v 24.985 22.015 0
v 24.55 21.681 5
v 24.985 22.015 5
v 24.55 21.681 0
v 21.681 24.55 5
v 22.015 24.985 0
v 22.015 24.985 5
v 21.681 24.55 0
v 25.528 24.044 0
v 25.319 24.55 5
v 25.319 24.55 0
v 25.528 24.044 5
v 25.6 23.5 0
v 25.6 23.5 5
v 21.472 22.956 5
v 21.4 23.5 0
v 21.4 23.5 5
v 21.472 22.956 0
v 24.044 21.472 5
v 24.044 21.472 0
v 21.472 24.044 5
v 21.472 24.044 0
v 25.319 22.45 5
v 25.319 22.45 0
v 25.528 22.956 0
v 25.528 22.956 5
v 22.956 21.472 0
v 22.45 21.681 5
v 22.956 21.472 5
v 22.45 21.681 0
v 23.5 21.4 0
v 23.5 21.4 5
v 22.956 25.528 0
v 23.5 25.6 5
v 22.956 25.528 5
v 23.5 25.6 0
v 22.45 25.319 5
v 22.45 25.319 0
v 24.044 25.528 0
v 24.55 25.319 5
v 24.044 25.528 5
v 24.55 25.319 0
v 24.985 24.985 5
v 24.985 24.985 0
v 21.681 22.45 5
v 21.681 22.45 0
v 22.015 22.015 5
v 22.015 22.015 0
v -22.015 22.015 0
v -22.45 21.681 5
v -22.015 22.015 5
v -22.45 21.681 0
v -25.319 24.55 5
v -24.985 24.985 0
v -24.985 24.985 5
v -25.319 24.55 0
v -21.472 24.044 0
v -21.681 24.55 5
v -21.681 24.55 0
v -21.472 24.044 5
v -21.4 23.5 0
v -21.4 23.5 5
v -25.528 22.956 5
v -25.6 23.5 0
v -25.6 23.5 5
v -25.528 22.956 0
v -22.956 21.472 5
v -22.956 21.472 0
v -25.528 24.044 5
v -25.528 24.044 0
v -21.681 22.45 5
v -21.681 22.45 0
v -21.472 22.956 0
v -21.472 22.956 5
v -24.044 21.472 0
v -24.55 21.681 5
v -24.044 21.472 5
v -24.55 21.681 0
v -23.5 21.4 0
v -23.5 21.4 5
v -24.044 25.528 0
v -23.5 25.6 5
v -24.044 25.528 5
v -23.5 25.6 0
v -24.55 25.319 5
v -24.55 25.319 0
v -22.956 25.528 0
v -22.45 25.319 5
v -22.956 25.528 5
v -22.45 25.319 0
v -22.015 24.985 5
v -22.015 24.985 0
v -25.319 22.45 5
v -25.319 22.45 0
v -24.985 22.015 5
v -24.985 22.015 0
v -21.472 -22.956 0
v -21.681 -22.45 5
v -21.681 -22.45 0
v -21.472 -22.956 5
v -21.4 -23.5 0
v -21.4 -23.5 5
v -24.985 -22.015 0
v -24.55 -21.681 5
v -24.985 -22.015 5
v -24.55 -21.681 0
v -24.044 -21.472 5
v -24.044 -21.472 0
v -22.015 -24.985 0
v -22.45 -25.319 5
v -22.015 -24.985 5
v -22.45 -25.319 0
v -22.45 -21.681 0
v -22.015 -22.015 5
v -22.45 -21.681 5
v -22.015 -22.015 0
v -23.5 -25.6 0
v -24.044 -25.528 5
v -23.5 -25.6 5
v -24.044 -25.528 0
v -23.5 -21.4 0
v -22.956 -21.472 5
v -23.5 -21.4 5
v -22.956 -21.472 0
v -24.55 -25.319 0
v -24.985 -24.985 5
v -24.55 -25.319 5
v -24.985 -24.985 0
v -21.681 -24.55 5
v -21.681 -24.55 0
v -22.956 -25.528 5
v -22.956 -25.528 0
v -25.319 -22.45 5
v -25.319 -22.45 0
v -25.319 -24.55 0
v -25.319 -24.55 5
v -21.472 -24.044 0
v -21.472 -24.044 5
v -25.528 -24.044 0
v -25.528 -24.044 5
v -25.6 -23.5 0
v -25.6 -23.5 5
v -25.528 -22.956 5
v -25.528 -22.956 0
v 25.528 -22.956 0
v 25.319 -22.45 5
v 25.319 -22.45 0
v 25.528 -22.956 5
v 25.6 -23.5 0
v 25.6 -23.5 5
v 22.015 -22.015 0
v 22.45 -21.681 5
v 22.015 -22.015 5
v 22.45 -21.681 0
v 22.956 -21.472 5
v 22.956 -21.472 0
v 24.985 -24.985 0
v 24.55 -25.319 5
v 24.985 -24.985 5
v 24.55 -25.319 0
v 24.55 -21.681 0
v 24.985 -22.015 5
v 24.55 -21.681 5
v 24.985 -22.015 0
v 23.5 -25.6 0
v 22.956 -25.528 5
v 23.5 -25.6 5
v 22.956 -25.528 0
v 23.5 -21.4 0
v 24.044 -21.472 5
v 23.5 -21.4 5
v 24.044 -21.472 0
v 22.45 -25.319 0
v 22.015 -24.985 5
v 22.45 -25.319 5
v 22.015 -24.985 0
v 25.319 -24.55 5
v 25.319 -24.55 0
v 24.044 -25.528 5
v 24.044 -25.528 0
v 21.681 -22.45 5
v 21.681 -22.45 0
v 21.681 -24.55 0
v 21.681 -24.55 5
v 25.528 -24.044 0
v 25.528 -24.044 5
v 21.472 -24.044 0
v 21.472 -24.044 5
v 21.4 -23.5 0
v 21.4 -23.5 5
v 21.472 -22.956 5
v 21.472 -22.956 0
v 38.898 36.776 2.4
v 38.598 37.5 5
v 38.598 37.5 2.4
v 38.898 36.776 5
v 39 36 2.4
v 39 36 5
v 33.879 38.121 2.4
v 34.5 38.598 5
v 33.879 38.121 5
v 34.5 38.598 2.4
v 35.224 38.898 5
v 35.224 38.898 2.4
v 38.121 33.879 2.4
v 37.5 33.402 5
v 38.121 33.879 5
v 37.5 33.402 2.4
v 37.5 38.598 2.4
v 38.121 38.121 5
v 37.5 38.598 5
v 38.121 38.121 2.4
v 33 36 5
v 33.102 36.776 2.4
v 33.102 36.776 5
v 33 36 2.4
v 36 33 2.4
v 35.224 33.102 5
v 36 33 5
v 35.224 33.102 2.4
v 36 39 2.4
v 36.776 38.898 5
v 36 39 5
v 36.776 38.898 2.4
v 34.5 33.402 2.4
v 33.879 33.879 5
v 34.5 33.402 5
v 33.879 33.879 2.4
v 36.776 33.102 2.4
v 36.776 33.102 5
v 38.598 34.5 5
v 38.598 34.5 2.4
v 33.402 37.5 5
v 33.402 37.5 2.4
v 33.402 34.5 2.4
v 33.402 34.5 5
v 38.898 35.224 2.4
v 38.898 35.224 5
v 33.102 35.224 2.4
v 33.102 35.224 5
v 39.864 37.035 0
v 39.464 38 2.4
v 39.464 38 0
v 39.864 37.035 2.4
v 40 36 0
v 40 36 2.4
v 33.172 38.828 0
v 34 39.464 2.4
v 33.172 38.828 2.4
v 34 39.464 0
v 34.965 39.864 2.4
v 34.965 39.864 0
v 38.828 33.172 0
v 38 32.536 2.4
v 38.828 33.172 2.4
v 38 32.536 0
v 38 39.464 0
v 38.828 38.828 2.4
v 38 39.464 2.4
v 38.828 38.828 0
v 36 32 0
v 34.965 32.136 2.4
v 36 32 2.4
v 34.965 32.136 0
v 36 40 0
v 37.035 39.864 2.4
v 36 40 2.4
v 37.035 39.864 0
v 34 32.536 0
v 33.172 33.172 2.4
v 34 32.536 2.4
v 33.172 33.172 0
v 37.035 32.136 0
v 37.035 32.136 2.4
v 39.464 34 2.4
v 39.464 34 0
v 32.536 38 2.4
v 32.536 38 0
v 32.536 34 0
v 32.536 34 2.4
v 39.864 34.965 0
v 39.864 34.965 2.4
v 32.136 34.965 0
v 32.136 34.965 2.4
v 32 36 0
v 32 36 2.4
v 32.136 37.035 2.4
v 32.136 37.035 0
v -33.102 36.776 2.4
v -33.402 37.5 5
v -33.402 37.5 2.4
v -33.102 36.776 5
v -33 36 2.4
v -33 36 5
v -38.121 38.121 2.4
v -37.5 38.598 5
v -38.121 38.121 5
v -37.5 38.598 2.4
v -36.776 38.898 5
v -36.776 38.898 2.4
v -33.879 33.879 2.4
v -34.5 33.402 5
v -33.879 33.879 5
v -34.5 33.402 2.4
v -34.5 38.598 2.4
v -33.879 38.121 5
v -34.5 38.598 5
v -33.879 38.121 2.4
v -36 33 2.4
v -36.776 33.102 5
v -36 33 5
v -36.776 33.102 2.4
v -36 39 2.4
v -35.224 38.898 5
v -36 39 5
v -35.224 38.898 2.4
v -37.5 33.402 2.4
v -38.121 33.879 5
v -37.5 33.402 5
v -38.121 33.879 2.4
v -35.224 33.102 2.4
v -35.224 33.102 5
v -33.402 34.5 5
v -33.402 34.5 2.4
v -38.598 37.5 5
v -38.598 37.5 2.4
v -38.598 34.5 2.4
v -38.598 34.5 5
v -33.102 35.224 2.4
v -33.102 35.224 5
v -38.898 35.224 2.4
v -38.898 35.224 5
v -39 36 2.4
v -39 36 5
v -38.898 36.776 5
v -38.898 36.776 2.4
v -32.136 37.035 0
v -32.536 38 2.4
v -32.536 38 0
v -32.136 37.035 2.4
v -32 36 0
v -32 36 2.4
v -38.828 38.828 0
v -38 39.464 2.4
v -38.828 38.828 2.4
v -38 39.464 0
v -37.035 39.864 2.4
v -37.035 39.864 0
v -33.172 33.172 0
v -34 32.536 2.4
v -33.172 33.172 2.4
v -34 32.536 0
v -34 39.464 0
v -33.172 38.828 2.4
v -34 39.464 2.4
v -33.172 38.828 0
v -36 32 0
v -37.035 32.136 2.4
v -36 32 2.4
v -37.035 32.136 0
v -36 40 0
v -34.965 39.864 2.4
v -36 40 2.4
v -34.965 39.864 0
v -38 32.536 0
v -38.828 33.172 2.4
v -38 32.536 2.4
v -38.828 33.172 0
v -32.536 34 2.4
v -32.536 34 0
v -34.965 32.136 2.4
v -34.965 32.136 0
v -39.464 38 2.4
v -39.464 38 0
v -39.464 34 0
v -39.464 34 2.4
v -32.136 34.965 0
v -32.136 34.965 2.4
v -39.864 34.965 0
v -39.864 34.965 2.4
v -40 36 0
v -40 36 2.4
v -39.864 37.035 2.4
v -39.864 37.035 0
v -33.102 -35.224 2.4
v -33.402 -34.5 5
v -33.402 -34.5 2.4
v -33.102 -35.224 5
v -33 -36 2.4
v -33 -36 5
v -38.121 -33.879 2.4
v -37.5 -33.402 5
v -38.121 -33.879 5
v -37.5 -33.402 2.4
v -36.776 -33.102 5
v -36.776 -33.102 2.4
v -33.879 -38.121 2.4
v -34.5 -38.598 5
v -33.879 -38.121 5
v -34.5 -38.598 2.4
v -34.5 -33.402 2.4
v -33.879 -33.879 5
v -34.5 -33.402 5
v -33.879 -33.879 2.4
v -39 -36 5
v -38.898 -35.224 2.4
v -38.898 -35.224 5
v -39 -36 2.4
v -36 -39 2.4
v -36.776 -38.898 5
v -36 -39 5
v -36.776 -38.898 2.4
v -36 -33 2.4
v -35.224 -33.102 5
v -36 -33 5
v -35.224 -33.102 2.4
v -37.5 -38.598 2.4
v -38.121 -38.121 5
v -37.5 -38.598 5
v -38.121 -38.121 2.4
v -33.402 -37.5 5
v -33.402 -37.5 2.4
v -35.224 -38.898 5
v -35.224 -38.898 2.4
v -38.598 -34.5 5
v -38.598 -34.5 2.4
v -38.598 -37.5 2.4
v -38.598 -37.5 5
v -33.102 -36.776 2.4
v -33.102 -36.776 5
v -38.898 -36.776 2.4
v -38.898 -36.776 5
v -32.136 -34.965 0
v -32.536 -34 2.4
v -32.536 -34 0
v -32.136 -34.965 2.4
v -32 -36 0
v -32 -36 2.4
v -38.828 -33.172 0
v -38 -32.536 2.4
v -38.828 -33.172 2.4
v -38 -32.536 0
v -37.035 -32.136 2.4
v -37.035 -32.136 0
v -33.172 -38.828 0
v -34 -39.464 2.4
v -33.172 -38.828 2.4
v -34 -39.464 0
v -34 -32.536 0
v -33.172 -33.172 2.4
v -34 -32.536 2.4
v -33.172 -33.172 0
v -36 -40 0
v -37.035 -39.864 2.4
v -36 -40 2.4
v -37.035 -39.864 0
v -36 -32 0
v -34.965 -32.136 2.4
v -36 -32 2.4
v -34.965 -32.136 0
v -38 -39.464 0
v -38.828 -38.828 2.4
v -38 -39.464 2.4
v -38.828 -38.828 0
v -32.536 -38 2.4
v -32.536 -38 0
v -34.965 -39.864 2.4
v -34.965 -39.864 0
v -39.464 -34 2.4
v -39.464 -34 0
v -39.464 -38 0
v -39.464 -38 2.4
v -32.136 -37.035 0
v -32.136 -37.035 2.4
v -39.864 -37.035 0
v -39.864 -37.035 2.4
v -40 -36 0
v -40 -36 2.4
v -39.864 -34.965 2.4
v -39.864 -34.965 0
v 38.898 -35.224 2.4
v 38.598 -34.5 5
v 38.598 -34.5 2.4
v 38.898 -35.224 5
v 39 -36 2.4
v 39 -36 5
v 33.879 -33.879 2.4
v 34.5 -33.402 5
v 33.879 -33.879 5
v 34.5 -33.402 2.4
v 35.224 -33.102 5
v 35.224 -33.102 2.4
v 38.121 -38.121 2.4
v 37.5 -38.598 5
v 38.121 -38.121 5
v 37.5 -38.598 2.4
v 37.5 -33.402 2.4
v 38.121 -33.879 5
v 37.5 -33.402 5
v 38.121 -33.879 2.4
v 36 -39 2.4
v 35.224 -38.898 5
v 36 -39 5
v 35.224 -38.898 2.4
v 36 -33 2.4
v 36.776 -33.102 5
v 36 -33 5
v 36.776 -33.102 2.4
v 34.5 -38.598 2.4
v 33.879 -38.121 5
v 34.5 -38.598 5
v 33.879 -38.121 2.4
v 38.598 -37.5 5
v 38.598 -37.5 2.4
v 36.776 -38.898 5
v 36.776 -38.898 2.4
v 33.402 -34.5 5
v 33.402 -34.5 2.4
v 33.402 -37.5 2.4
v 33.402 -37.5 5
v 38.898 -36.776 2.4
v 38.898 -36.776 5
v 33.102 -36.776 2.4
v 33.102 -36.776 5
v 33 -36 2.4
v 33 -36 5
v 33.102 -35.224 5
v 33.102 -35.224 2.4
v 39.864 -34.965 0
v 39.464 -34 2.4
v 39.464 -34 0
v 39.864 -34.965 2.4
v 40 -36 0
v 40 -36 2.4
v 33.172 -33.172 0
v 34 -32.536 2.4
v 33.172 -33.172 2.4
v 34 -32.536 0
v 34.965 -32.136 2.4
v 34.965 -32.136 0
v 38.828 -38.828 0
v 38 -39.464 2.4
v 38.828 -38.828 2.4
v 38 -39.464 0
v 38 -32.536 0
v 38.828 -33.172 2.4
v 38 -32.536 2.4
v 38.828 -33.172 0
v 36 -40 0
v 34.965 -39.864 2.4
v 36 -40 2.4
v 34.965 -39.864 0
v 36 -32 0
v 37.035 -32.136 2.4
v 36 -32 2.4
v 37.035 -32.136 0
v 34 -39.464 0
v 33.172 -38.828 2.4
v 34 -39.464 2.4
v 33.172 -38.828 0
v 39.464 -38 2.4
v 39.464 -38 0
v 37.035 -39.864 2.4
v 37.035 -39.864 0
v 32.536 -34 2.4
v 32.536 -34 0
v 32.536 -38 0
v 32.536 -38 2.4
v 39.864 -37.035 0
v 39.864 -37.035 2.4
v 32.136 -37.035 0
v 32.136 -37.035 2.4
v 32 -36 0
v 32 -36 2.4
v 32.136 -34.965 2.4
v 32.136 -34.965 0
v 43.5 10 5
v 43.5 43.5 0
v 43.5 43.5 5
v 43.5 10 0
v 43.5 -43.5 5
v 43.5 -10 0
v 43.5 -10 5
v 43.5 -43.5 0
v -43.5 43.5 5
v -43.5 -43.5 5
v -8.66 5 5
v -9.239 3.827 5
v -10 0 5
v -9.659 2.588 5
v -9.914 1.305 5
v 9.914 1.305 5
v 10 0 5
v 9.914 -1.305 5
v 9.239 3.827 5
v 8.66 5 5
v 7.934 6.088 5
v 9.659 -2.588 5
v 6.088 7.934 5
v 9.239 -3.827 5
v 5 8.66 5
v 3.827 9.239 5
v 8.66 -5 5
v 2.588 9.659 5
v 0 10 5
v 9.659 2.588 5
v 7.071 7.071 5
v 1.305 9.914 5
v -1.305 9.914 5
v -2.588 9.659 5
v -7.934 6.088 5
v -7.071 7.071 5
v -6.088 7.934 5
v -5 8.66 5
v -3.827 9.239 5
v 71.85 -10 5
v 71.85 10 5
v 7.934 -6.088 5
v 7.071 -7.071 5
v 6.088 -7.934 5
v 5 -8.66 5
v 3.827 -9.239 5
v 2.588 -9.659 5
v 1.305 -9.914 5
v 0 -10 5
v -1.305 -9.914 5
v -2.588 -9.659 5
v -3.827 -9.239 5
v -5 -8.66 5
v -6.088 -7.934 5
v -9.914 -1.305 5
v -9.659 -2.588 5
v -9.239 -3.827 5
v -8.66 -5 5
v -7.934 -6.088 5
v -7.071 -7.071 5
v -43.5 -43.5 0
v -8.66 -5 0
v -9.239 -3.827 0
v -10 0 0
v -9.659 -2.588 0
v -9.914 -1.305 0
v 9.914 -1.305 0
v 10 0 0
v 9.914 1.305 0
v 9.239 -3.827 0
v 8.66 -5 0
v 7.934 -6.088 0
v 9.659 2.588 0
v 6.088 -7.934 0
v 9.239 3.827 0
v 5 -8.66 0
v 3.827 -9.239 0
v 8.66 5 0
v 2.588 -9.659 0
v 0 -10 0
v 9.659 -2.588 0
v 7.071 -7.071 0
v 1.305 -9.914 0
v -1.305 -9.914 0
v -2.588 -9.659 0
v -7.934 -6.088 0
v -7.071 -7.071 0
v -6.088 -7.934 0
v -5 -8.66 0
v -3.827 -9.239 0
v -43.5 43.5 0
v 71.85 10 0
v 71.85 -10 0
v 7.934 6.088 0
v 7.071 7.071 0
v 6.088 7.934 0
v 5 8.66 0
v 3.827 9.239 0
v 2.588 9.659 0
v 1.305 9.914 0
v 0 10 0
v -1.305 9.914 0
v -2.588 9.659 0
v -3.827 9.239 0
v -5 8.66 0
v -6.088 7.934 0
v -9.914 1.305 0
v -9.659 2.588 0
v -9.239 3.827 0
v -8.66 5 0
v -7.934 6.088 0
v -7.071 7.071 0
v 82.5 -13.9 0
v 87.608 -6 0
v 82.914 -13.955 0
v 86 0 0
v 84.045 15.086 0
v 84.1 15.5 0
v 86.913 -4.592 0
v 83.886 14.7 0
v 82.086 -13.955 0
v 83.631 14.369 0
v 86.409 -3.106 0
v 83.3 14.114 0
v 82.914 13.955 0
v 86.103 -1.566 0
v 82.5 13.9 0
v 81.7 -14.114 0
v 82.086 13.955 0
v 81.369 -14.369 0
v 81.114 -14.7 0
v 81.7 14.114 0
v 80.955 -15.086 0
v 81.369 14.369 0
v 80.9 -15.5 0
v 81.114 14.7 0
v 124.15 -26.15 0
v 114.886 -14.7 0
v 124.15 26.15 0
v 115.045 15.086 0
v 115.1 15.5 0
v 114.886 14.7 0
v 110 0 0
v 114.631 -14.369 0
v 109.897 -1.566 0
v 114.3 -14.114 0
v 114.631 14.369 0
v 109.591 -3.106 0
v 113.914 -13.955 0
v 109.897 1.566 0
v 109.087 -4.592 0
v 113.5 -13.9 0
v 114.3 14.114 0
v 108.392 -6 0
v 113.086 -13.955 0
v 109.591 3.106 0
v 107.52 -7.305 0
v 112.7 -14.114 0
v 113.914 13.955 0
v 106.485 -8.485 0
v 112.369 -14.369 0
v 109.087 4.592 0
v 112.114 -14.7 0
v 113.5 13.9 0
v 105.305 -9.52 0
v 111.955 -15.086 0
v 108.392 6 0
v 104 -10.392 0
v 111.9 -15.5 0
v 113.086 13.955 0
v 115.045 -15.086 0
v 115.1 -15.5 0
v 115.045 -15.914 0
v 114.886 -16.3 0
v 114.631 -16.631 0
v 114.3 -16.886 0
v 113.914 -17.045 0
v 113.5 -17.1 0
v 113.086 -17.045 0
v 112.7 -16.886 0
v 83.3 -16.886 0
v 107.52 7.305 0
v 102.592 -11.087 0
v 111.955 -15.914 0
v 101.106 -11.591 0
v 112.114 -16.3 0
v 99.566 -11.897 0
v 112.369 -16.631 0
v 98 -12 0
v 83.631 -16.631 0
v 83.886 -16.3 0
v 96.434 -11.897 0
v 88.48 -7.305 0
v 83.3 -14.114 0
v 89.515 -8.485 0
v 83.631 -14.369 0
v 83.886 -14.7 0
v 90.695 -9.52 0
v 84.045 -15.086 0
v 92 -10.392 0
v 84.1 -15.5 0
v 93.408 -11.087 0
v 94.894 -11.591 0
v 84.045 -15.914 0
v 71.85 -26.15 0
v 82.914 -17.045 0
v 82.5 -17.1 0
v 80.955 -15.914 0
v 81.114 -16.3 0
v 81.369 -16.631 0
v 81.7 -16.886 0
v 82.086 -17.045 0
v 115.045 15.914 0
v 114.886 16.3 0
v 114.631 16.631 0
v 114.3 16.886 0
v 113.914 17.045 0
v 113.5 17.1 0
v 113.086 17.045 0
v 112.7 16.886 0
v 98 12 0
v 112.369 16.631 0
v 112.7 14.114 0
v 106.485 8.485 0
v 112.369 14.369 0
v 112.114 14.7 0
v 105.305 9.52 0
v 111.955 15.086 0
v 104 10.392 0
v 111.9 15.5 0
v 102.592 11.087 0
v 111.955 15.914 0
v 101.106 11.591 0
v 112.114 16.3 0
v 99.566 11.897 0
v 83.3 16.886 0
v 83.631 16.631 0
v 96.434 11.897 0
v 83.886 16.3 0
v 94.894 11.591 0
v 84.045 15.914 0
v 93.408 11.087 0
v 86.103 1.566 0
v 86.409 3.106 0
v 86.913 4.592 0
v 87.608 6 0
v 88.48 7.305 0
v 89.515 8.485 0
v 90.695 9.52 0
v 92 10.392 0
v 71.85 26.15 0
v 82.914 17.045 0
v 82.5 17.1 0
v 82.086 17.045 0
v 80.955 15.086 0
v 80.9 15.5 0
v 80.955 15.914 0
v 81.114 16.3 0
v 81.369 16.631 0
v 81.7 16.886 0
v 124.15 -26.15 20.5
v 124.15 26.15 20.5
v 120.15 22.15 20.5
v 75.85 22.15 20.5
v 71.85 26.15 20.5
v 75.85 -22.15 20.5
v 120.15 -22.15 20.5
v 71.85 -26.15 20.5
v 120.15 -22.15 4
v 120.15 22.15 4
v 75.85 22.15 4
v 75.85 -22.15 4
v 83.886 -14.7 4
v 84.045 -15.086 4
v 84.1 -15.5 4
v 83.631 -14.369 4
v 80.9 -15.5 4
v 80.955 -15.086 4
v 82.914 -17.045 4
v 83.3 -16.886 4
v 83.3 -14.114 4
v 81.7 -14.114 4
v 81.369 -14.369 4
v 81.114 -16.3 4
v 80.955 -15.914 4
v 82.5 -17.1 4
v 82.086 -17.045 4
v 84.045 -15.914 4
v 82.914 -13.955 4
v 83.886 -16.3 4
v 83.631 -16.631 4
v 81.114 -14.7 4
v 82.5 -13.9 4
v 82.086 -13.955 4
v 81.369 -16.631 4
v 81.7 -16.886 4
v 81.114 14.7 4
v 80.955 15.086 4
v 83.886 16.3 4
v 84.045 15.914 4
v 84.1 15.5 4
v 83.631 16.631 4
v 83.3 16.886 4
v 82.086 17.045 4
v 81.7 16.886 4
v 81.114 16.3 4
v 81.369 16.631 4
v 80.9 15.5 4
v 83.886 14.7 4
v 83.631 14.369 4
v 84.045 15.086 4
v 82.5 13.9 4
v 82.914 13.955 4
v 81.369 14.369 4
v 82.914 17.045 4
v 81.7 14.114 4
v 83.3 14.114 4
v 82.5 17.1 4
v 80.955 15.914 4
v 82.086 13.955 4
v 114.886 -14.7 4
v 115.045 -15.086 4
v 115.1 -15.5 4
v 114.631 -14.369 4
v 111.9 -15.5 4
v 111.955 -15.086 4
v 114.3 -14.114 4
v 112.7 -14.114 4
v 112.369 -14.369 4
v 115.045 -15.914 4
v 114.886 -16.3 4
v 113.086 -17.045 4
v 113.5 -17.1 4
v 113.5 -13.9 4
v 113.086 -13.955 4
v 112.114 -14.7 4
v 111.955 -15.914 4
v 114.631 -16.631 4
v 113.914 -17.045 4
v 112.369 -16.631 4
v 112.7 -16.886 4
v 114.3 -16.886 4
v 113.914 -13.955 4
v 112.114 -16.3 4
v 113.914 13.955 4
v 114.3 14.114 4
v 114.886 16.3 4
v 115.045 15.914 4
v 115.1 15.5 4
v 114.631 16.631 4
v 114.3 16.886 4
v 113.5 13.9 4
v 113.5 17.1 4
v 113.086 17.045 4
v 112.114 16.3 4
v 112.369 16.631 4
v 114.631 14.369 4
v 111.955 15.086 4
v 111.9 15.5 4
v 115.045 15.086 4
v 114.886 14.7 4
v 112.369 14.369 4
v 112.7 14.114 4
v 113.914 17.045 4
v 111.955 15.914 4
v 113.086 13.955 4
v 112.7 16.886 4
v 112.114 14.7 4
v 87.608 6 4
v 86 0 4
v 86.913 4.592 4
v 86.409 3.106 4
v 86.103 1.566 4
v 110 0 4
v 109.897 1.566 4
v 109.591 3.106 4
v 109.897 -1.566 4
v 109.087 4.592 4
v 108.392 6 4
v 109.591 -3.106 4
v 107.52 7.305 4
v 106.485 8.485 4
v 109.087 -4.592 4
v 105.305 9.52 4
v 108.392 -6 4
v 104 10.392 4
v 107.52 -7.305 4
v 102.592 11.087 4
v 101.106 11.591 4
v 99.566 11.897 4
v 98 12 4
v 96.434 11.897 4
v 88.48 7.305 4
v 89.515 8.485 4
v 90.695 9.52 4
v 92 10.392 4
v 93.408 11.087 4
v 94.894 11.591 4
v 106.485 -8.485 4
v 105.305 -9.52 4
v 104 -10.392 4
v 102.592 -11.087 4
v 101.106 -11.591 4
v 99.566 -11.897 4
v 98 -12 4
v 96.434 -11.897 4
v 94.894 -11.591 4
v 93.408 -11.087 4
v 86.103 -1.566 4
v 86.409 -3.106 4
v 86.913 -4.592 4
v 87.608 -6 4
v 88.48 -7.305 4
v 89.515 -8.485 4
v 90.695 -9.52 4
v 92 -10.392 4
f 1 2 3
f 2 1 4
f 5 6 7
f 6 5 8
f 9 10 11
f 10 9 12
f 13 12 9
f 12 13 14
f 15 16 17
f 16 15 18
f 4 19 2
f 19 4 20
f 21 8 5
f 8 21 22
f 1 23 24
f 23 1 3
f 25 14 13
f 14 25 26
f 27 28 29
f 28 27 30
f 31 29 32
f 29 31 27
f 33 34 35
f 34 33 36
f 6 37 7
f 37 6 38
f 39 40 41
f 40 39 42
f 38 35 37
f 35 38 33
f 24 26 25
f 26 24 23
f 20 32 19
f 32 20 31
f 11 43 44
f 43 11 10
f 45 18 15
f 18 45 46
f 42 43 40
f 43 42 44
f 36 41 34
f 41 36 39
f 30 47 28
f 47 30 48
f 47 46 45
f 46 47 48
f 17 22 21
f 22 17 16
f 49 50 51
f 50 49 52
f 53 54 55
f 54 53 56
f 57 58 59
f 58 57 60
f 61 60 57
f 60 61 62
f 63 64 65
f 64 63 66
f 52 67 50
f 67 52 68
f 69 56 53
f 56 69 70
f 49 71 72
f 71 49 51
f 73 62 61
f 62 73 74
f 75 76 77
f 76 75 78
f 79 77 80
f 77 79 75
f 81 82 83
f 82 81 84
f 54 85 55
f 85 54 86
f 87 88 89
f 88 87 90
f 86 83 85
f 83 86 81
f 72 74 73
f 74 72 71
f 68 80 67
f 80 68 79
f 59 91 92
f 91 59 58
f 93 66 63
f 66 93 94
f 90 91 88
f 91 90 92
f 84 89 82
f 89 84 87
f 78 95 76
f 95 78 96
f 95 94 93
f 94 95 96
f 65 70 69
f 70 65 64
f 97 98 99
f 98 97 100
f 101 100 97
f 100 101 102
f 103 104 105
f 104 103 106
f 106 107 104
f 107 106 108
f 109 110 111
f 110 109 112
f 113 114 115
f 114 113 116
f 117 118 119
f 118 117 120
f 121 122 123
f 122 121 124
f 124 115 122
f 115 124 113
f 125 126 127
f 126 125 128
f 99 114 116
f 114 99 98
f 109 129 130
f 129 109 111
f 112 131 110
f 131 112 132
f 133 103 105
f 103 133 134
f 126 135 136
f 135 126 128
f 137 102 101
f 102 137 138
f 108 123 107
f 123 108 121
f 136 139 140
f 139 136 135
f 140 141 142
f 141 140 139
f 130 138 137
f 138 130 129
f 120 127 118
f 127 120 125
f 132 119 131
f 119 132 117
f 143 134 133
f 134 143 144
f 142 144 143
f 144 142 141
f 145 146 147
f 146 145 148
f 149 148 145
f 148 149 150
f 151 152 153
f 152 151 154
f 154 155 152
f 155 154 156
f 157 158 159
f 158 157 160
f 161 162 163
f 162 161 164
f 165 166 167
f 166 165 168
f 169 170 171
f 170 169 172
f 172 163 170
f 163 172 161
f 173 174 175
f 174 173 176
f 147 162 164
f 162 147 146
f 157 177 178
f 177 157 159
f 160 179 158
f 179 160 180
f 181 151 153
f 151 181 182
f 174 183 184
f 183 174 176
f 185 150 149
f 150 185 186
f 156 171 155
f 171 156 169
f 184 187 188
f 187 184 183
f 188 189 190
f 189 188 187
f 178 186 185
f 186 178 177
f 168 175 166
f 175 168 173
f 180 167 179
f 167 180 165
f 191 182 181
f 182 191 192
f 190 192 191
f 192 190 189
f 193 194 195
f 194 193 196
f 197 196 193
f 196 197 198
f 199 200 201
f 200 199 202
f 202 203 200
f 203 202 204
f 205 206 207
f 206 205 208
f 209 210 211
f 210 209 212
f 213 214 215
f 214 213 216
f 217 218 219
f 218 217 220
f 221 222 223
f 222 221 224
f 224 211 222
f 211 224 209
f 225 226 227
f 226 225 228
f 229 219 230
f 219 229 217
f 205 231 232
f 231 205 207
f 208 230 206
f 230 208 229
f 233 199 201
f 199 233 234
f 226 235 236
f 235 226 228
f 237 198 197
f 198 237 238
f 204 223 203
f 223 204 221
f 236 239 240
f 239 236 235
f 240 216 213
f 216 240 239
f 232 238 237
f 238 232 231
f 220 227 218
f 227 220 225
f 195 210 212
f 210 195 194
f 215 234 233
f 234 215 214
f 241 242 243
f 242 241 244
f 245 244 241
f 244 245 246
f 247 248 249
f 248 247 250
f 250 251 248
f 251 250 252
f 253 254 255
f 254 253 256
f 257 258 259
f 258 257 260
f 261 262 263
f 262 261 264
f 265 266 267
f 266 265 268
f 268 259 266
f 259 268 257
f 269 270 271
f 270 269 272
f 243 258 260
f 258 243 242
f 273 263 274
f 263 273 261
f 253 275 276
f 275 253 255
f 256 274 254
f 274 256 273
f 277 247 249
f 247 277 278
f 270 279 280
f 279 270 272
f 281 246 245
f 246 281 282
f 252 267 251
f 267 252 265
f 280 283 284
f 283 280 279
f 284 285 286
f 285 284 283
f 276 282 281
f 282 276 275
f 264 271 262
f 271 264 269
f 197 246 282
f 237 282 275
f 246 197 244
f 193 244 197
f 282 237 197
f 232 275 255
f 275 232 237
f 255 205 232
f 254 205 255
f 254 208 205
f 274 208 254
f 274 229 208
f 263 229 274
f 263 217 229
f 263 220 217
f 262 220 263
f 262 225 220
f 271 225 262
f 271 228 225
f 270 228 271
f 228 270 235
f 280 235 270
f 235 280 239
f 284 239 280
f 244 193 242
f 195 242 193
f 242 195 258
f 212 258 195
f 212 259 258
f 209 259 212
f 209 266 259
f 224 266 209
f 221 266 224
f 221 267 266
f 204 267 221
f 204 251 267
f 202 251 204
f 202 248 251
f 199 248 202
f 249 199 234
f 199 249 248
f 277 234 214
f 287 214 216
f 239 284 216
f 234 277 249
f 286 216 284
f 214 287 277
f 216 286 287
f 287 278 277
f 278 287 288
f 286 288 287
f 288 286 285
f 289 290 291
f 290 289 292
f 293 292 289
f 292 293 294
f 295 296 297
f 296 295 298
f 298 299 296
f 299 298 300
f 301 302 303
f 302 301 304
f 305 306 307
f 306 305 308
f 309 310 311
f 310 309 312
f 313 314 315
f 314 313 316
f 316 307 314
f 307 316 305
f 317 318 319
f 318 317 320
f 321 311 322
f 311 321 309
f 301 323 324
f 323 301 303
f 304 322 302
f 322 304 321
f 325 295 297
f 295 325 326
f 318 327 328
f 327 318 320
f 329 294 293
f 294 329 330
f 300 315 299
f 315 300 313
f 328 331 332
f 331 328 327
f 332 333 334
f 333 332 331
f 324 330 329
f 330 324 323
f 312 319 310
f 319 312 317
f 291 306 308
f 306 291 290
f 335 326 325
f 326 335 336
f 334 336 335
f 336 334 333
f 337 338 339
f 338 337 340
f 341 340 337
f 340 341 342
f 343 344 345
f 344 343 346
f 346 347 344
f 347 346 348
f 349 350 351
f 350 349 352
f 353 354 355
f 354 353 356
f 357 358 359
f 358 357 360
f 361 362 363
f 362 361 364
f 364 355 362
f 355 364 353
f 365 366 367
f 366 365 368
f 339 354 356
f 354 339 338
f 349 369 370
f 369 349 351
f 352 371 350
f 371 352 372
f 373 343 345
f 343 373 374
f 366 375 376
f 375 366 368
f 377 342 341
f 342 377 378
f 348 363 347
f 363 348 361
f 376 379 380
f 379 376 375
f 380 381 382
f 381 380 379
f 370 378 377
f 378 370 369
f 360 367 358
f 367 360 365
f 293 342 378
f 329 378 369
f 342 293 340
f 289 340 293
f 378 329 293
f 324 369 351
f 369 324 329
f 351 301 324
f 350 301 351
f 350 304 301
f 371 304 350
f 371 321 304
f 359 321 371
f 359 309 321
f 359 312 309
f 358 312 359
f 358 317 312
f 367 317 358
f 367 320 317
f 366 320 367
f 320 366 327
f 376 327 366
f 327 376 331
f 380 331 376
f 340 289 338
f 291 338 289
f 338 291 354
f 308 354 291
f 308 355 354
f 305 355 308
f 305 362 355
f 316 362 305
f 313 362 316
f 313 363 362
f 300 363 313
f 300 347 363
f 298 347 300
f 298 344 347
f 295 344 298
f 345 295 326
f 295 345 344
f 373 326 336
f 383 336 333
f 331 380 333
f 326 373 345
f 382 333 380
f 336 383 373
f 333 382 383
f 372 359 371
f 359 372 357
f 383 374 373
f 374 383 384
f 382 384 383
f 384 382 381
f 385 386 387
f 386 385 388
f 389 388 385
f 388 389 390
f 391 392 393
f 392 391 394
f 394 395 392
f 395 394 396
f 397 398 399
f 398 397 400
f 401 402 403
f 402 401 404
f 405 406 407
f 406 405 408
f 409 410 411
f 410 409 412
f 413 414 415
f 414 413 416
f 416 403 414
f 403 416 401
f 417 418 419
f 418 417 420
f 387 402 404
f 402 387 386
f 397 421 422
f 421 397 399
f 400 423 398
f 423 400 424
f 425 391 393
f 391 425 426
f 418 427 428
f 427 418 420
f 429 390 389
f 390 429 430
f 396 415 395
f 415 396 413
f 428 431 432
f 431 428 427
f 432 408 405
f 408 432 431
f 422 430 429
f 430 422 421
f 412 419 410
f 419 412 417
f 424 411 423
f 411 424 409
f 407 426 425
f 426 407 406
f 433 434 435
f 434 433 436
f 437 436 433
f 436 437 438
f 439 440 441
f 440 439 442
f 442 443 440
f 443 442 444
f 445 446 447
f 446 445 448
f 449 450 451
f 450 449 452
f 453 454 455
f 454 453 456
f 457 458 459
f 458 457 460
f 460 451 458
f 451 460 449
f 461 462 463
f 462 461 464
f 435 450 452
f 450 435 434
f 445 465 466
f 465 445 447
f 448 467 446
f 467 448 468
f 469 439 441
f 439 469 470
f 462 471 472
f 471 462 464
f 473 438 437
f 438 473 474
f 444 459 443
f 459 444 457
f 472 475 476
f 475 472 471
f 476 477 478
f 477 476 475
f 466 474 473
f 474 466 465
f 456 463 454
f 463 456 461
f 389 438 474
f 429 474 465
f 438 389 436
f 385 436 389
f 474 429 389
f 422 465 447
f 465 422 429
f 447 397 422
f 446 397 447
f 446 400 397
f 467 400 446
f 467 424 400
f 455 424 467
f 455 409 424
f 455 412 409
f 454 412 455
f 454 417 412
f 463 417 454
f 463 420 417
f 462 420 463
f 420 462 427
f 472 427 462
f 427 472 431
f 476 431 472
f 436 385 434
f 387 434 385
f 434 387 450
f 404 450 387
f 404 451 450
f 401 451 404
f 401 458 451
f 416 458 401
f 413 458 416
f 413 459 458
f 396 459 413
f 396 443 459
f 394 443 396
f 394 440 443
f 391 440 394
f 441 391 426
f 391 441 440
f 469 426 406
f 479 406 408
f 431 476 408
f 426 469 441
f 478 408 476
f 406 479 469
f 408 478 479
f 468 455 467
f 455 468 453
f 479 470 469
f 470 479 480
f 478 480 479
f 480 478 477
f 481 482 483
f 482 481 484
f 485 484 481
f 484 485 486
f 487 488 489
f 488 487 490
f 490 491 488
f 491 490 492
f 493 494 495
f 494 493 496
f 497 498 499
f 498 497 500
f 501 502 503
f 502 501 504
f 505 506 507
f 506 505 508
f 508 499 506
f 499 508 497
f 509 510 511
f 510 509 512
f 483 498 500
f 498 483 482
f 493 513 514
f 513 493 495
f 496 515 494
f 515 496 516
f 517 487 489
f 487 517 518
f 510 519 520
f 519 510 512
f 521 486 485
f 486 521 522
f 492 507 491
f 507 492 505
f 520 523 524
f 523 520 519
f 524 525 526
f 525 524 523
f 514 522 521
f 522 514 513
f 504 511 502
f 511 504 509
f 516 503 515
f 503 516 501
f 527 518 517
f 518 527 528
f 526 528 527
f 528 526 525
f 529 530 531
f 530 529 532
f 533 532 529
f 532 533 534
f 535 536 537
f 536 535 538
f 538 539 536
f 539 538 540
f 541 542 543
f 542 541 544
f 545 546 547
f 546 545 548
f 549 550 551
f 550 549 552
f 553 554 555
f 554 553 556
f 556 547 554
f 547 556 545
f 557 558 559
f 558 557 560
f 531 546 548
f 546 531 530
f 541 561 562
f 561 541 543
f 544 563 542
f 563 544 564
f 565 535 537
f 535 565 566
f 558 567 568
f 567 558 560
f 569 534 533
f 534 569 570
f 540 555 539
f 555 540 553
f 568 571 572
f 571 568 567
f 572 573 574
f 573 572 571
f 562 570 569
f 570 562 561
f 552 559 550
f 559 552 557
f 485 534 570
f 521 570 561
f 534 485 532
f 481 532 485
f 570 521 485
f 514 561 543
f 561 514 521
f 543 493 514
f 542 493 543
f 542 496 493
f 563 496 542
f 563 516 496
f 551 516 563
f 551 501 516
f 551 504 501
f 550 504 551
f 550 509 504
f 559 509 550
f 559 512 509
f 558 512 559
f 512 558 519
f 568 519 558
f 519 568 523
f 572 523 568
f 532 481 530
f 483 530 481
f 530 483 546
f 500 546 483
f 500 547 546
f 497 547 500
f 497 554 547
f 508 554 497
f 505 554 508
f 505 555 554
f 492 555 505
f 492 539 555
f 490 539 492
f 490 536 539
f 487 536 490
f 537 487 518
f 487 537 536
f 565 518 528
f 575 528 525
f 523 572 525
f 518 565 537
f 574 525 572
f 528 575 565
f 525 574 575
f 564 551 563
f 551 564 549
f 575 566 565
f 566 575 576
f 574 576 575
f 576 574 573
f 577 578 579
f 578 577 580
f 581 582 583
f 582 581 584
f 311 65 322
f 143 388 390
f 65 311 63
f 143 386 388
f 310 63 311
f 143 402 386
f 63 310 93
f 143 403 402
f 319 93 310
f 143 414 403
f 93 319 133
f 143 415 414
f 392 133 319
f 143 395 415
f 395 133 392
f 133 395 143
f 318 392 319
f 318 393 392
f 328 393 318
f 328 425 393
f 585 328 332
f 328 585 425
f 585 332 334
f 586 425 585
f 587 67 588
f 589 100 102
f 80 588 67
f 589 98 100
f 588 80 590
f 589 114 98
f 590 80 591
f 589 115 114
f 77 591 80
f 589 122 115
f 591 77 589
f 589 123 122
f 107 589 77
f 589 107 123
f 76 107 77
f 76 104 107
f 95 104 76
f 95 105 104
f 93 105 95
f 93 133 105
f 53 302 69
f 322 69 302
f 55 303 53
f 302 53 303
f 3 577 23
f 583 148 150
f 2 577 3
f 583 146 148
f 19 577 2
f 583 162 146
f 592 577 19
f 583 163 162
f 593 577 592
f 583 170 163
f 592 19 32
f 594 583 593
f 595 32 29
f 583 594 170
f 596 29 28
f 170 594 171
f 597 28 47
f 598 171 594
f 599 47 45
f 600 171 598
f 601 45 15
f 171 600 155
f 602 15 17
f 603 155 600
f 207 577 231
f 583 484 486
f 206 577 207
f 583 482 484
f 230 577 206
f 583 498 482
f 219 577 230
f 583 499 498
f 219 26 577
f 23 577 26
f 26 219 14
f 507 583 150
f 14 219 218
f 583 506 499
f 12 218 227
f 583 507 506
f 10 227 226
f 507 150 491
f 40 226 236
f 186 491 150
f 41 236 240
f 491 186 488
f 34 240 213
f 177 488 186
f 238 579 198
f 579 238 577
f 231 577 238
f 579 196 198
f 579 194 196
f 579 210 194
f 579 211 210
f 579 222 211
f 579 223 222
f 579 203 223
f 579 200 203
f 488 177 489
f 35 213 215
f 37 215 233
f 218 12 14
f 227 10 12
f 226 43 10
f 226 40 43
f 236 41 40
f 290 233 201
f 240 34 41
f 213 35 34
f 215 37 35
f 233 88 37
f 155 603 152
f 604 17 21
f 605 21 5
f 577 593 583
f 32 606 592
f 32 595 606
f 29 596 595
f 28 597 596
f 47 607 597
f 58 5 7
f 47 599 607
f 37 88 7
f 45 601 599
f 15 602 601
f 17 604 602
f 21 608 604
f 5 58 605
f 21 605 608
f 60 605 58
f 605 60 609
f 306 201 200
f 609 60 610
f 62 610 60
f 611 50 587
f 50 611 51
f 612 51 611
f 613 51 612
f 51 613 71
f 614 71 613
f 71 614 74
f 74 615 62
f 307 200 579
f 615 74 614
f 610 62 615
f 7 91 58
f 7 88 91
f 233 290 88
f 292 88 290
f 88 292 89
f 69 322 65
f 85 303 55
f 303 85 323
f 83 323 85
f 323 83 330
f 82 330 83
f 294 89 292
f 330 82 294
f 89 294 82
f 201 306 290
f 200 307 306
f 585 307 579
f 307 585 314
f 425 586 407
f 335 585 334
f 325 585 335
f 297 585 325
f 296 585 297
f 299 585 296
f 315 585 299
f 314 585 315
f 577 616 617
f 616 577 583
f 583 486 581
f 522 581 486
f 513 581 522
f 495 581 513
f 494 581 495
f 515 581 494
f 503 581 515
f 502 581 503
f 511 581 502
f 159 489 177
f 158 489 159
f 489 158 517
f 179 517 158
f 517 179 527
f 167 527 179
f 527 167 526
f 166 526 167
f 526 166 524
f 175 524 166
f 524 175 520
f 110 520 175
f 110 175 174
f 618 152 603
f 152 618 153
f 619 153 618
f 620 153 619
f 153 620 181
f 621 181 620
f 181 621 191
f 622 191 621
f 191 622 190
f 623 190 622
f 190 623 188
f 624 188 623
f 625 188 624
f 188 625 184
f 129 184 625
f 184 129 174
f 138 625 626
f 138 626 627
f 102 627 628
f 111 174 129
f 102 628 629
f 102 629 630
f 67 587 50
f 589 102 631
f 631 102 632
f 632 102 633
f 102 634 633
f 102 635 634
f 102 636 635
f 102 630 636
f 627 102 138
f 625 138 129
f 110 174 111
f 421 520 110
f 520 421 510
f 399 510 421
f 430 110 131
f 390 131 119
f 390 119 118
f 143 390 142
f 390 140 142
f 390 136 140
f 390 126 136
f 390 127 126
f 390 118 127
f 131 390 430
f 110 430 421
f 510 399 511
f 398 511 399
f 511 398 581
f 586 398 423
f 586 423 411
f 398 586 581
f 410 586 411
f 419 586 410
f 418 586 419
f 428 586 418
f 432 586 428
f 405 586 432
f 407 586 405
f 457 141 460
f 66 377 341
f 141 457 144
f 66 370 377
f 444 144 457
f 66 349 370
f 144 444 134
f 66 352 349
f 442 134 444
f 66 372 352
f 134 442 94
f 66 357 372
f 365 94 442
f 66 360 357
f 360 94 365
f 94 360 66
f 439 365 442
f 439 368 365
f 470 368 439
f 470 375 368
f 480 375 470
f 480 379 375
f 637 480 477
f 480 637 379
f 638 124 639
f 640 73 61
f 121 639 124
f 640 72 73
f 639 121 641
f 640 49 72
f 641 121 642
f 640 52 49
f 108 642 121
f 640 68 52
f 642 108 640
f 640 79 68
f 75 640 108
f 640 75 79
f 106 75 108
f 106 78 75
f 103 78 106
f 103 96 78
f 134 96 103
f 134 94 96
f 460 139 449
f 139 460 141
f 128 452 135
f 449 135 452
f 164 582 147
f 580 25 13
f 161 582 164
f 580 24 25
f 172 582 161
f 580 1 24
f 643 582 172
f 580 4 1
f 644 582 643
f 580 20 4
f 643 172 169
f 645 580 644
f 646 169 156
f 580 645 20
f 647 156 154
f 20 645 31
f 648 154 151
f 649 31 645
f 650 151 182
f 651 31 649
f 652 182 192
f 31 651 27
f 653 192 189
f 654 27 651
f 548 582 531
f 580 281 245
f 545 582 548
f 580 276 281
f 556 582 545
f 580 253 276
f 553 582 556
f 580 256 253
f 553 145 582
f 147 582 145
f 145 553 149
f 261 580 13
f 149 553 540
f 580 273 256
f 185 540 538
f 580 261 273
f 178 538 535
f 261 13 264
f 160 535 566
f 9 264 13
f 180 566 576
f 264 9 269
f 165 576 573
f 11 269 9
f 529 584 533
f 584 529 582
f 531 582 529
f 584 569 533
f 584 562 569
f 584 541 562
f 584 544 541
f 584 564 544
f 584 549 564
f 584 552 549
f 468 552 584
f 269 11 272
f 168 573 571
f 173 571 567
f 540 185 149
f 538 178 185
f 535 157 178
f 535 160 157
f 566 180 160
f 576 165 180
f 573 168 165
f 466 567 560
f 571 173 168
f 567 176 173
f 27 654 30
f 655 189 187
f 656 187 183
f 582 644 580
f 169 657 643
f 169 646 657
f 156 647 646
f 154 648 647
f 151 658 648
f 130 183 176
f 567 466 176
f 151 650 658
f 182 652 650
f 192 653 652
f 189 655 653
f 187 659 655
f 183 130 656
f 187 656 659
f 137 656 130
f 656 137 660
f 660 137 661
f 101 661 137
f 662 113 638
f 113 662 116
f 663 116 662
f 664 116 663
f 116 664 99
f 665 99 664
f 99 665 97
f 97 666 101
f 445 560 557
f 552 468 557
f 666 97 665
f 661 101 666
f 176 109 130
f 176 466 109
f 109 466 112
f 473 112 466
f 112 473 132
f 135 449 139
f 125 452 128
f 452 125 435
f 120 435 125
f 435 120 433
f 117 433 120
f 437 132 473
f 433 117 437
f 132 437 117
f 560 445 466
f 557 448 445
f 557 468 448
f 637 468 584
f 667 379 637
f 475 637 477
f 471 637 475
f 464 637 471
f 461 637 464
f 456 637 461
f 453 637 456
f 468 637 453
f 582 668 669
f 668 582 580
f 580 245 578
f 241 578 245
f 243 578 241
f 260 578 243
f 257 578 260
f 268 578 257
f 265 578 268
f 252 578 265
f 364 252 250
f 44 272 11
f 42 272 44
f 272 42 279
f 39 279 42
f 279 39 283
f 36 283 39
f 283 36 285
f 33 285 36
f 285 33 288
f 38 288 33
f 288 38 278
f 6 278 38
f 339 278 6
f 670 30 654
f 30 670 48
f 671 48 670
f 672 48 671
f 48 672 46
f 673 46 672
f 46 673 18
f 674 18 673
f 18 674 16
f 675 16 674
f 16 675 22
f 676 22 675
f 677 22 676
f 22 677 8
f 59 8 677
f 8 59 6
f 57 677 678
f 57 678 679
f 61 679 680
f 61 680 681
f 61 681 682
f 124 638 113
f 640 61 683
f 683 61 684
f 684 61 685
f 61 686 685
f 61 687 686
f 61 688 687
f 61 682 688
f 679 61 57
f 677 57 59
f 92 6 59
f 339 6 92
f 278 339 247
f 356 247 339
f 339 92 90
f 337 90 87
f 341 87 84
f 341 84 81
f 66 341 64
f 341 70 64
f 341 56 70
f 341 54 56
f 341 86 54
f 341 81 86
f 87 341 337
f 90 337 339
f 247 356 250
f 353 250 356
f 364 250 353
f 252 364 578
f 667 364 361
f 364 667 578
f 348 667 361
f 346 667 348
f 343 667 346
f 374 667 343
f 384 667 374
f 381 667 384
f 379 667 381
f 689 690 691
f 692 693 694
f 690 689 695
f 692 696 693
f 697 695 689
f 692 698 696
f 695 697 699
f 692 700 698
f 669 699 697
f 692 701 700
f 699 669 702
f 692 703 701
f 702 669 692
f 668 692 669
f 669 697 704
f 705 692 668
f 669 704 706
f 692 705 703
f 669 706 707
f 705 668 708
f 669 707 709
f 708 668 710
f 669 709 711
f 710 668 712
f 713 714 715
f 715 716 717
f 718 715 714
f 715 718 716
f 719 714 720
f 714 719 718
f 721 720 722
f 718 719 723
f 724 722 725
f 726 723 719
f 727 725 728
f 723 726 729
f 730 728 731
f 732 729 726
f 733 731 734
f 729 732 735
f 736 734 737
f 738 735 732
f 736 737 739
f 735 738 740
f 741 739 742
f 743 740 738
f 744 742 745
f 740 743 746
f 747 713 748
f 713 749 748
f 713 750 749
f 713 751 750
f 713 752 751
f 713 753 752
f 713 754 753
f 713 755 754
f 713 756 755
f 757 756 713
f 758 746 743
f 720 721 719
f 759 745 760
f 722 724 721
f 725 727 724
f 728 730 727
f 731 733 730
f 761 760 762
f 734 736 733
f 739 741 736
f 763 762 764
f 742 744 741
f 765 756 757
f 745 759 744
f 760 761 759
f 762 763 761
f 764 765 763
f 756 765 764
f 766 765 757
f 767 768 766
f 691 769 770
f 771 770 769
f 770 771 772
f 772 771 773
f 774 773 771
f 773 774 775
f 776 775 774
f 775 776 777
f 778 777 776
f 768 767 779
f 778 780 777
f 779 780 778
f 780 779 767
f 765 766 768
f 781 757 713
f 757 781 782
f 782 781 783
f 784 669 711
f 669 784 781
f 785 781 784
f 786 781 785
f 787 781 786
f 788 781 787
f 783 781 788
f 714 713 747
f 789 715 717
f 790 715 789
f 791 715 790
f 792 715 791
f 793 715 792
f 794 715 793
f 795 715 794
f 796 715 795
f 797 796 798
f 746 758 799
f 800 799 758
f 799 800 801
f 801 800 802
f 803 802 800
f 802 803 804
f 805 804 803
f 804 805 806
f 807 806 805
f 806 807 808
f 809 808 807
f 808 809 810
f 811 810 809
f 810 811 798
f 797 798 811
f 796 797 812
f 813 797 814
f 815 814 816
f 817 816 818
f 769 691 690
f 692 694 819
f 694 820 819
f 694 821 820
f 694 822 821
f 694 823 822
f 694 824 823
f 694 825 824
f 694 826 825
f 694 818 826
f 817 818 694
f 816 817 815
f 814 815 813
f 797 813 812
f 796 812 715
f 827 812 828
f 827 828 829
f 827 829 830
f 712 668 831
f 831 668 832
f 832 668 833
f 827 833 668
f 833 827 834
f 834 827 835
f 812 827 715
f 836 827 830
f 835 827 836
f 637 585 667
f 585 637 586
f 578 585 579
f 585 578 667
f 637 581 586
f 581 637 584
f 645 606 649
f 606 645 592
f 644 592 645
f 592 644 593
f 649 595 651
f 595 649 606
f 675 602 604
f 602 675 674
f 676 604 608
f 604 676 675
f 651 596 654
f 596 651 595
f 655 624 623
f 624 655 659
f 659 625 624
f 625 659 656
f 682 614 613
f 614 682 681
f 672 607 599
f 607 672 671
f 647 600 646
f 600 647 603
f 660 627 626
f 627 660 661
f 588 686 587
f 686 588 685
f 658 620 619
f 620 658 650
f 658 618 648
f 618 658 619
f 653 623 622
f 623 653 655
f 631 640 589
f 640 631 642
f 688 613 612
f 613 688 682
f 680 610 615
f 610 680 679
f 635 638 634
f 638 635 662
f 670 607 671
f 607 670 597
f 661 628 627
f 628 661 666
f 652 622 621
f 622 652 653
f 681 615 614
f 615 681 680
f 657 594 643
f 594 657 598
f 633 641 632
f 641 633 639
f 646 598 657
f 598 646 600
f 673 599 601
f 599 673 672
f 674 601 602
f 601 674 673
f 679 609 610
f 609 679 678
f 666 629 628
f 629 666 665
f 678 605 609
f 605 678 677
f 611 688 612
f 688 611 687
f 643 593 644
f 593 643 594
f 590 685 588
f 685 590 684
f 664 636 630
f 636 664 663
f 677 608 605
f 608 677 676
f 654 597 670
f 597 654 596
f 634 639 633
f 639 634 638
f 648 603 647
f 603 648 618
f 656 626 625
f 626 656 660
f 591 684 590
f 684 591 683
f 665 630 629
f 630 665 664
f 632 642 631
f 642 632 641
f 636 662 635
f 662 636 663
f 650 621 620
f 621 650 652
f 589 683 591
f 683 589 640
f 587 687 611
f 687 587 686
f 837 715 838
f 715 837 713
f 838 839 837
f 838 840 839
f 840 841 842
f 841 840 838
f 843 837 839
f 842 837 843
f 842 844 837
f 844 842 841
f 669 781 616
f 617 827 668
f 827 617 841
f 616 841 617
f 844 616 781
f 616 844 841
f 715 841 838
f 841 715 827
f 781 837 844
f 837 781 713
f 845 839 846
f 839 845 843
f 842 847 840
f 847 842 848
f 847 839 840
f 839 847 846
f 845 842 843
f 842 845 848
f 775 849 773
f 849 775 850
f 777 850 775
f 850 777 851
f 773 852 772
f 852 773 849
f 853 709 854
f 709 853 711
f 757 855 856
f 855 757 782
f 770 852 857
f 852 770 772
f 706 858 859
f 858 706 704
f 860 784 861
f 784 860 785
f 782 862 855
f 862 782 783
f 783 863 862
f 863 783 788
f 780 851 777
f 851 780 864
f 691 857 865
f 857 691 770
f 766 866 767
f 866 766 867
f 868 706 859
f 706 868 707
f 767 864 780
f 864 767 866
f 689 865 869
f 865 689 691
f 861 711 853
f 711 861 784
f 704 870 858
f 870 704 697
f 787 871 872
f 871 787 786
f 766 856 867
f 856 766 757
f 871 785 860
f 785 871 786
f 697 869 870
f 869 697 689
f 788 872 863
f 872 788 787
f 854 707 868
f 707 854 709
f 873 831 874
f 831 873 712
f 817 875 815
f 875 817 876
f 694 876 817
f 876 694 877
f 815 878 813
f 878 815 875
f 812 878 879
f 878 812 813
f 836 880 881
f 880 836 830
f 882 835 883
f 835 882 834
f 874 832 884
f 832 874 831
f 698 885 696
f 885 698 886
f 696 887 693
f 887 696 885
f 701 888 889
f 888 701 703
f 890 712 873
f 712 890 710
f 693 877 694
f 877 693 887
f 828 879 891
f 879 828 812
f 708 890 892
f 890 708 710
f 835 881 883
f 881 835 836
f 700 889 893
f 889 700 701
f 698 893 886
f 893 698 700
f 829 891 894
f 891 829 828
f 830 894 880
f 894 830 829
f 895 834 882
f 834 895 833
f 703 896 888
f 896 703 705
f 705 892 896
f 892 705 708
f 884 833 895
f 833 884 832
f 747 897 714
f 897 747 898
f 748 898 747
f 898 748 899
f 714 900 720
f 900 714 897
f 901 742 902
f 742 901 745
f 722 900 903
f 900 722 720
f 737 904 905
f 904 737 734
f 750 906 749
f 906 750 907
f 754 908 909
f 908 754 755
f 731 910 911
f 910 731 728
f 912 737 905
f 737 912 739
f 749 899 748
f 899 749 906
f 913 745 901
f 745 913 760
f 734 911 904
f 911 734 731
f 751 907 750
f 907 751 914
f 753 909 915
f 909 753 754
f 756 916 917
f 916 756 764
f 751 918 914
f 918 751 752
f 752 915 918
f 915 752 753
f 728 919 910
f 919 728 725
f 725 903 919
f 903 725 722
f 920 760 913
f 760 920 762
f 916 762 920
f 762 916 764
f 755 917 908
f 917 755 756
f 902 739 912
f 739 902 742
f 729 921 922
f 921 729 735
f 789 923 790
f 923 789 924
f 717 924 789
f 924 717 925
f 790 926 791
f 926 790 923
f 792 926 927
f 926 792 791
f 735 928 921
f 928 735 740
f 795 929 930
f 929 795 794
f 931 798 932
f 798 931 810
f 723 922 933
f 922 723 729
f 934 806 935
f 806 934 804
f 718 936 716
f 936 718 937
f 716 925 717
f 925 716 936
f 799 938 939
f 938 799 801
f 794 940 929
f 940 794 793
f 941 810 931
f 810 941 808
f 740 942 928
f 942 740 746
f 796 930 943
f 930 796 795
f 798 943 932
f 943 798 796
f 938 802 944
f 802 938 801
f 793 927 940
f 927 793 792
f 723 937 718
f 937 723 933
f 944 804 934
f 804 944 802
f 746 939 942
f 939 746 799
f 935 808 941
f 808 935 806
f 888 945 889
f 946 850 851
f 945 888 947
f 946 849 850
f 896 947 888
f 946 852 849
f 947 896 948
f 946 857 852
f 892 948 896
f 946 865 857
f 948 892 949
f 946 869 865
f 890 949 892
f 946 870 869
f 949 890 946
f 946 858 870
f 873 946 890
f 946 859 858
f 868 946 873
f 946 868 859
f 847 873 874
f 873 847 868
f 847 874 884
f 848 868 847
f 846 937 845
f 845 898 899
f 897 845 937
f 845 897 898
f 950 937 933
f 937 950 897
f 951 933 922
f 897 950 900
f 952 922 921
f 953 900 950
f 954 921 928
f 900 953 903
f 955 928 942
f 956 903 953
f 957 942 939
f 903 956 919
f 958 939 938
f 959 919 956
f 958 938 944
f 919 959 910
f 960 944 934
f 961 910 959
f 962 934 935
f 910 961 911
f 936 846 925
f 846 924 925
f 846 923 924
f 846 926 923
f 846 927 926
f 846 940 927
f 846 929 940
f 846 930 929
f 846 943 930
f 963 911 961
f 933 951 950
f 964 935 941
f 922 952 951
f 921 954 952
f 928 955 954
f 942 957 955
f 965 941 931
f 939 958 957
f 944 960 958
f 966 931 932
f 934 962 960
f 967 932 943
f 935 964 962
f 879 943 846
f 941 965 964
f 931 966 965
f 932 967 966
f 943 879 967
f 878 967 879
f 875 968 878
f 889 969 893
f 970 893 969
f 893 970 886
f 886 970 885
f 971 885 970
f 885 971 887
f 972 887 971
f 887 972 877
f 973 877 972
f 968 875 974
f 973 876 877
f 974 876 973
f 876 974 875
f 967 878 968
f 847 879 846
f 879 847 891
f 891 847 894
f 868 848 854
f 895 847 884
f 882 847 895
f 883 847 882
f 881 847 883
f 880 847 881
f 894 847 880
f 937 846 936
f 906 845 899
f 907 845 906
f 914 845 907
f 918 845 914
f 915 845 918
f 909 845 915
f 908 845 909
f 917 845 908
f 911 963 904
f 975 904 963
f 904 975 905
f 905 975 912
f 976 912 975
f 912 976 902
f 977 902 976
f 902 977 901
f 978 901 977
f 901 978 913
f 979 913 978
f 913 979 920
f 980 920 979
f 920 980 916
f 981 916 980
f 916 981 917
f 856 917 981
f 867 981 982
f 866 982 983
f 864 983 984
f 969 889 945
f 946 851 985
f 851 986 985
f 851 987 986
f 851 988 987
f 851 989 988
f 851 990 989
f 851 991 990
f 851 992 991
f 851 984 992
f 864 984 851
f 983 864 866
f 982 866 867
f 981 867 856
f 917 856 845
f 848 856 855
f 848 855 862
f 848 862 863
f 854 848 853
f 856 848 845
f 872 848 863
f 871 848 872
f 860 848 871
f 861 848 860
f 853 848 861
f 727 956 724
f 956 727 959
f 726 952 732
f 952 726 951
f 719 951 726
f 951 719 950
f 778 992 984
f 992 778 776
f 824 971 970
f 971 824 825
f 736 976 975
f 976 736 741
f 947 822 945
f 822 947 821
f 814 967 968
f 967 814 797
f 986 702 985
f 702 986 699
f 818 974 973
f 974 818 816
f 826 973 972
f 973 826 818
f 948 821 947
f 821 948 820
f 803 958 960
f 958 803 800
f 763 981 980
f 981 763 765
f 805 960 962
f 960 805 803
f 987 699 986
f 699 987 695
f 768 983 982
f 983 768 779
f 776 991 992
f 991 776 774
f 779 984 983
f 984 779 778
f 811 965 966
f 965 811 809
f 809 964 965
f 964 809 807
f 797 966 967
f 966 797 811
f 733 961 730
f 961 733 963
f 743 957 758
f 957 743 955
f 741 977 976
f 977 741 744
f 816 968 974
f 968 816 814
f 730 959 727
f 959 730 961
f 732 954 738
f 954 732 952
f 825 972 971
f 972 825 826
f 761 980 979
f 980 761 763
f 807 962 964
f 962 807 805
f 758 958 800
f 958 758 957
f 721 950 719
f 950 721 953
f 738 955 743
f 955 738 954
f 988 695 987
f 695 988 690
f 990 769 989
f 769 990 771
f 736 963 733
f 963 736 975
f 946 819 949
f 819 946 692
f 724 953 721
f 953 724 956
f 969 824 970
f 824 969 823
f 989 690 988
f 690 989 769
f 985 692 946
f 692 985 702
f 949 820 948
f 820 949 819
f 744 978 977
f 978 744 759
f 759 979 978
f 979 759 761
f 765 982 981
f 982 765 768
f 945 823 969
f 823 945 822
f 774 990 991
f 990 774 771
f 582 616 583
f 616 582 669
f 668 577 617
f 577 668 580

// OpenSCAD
// ============================================
// PiCanvas - 모델 B: 벽면 브라켓 + 모터 마운트
// ============================================

// --- 파라미터 ---

// 턴테이블 베어링
tb_size = 57;
tb_thickness = 10.5;
tb_bolt_inset = 5;
tb_bolt_dia = 4.2;     // M4 관통홀

// 모터 17HS4023
motor_w = 42.3;
motor_h = 42.3;
motor_d = 23.5;
motor_shaft_dia = 5;
motor_mount_pitch = 31;   // NEMA17 마운트홀 피치
motor_mount_hole = 3.2;   // M3 관통홀
motor_body_dia = 22;      // 모터 전면 보스 직경

// 벨트 시스템
belt_center_distance = 98;  // 축간 거리 (300mm 벨트)

// 모터 위치: 중심에서 belt_center_distance만큼 오프셋
// 모터를 오른쪽(+X)에 배치
motor_offset_x = belt_center_distance;
motor_offset_y = 0;

// 벽면 브라켓
wall_plate_thickness = 5;
wall_plate_margin = 15;    // 턴테이블 주변 여유
wall_anchor_dia = 6;       // 벽 앵커홀 직경
wall_anchor_count_head = 8; // 카운터싱크 직경

// 모터 마운트 (측면 클램프)
motor_clamp_wall = 4;      // 클램프 벽 두께
motor_clamp_gap = 1;       // 모터와의 간극
motor_clamp_height = motor_d - 3;  // 모터 높이보다 살짝 낮게

// Z 높이 맞춤
// 풀리 벨트 면이 모델A의 80T 풀리와 같은 높이여야 함
// 모델A: bracket_thickness(5) + pulley위치
// 모델B에서 모터 샤프트 높이를 맞춤
gt2_belt_width = 6;
bracket_a_thickness = 5;
pulley_ring_offset = bracket_a_thickness + 1;  // 풀리 벨트 중심 Z

// --- 모듈 ---

// 턴테이블 볼트홀 패턴
module tb_bolt_pattern(dia, depth) {
    bolt_x = tb_size/2 - tb_bolt_inset;
    bolt_y = tb_size/2 - tb_bolt_inset;
    positions = [
        [ bolt_x,  bolt_y],
        [-bolt_x,  bolt_y],
        [-bolt_x, -bolt_y],
        [ bolt_x, -bolt_y]
    ];
    for (pos = positions) {
        translate([pos[0], pos[1], -0.1])
            cylinder(d = dia, h = depth + 0.2, $fn = 24);
    }
}

// 벽면 앵커홀
module wall_anchor_holes() {
    // 턴테이블 바깥 코너 4곳
    anchor_offset = tb_size/2 + wall_plate_margin/2;
    positions = [
        [ anchor_offset,  anchor_offset],
        [-anchor_offset,  anchor_offset],
        [-anchor_offset, -anchor_offset],
        [ anchor_offset, -anchor_offset]
    ];
    for (pos = positions) {
        translate([pos[0], pos[1], -0.1]) {
            cylinder(d = wall_anchor_dia, h = wall_plate_thickness + 0.2, $fn = 24);
            // 카운터싱크
            cylinder(d = wall_anchor_count_head, h = 2.5, $fn = 24);
        }
    }
}

// 모터 측면 클램프 (축 수직, 샤프트 위 방향)
module motor_side_clamp() {
    inner_w = motor_w + motor_clamp_gap * 2;
    inner_h = motor_h + motor_clamp_gap * 2;
    outer_w = inner_w + motor_clamp_wall * 2;
    outer_h = inner_h + motor_clamp_wall * 2;

    difference() {
        // 외부 박스
        translate([-outer_w/2, -outer_h/2, 0])
            cube([outer_w, outer_h, motor_clamp_height]);

        // 모터 삽입 공간
        translate([-inner_w/2, -inner_h/2, -0.1])
            cube([inner_w, inner_h, motor_clamp_height + 0.2]);

        // 샤프트 통과 구멍 (위쪽)
        translate([0, 0, -0.1])
            cylinder(d = motor_body_dia + 2, h = motor_clamp_height + 0.2, $fn = 48);
    }

    // NEMA17 마운트 서포트 (바닥판)
    difference() {
        translate([-outer_w/2, -outer_h/2, 0])
            cube([outer_w, outer_h, motor_clamp_wall]);

        // 샤프트 통과
        translate([0, 0, -0.1])
            cylinder(d = motor_body_dia + 2, h = motor_clamp_wall + 0.2, $fn = 48);

        // NEMA17 마운트 볼트홀
        for (x = [-motor_mount_pitch/2, motor_mount_pitch/2])
            for (y = [-motor_mount_pitch/2, motor_mount_pitch/2])
                translate([x, y, -0.1])
                    cylinder(d = motor_mount_hole, h = motor_clamp_wall + 0.2, $fn = 24);
    }
}

// 연결 브릿지 (턴테이블 플레이트 → 모터 마운트)
module bridge() {
    bridge_width = 20;
    bridge_height = wall_plate_thickness;

    // 턴테이블 중심에서 모터 중심까지
    hull() {
        translate([tb_size/2, -bridge_width/2, 0])
            cube([1, bridge_width, bridge_height]);
        translate([motor_offset_x - motor_w/2 - motor_clamp_wall - motor_clamp_gap, -bridge_width/2, 0])
            cube([1, bridge_width, bridge_height]);
    }
}

// --- 메인 ---

module model_b_wall_bracket() {
    // 턴테이블 마운트 플레이트
    color("OrangeRed") {
        plate_size = tb_size + wall_plate_margin * 2;
        difference() {
            translate([-plate_size/2, -plate_size/2, 0])
                cube([plate_size, plate_size, wall_plate_thickness]);

            // 턴테이블 볼트홀 (고정판)
            tb_bolt_pattern(tb_bolt_dia, wall_plate_thickness);

            // 벽면 앵커홀
            wall_anchor_holes();

            // 중앙 관통홀 (케이블)
            translate([0, 0, -0.1])
                cylinder(d = 20, h = wall_plate_thickness + 0.2, $fn = 48);
        }
    }

    // 모터 마운트 브릿지
    color("OrangeRed")
        bridge();

    // 모터 클램프
    color("Tomato")
        translate([motor_offset_x, motor_offset_y, 0])
            motor_side_clamp();
}

model_b_wall_bracket();

// 디버그: 턴테이블 베어링 (투명)
%translate([-tb_size/2, -tb_size/2, wall_plate_thickness])
    cube([tb_size, tb_size, tb_thickness]);

// 디버그: 모터 (투명)
%translate([motor_offset_x - motor_w/2, motor_offset_y - motor_h/2, motor_clamp_wall])
    cube([motor_w, motor_h, motor_d]);
